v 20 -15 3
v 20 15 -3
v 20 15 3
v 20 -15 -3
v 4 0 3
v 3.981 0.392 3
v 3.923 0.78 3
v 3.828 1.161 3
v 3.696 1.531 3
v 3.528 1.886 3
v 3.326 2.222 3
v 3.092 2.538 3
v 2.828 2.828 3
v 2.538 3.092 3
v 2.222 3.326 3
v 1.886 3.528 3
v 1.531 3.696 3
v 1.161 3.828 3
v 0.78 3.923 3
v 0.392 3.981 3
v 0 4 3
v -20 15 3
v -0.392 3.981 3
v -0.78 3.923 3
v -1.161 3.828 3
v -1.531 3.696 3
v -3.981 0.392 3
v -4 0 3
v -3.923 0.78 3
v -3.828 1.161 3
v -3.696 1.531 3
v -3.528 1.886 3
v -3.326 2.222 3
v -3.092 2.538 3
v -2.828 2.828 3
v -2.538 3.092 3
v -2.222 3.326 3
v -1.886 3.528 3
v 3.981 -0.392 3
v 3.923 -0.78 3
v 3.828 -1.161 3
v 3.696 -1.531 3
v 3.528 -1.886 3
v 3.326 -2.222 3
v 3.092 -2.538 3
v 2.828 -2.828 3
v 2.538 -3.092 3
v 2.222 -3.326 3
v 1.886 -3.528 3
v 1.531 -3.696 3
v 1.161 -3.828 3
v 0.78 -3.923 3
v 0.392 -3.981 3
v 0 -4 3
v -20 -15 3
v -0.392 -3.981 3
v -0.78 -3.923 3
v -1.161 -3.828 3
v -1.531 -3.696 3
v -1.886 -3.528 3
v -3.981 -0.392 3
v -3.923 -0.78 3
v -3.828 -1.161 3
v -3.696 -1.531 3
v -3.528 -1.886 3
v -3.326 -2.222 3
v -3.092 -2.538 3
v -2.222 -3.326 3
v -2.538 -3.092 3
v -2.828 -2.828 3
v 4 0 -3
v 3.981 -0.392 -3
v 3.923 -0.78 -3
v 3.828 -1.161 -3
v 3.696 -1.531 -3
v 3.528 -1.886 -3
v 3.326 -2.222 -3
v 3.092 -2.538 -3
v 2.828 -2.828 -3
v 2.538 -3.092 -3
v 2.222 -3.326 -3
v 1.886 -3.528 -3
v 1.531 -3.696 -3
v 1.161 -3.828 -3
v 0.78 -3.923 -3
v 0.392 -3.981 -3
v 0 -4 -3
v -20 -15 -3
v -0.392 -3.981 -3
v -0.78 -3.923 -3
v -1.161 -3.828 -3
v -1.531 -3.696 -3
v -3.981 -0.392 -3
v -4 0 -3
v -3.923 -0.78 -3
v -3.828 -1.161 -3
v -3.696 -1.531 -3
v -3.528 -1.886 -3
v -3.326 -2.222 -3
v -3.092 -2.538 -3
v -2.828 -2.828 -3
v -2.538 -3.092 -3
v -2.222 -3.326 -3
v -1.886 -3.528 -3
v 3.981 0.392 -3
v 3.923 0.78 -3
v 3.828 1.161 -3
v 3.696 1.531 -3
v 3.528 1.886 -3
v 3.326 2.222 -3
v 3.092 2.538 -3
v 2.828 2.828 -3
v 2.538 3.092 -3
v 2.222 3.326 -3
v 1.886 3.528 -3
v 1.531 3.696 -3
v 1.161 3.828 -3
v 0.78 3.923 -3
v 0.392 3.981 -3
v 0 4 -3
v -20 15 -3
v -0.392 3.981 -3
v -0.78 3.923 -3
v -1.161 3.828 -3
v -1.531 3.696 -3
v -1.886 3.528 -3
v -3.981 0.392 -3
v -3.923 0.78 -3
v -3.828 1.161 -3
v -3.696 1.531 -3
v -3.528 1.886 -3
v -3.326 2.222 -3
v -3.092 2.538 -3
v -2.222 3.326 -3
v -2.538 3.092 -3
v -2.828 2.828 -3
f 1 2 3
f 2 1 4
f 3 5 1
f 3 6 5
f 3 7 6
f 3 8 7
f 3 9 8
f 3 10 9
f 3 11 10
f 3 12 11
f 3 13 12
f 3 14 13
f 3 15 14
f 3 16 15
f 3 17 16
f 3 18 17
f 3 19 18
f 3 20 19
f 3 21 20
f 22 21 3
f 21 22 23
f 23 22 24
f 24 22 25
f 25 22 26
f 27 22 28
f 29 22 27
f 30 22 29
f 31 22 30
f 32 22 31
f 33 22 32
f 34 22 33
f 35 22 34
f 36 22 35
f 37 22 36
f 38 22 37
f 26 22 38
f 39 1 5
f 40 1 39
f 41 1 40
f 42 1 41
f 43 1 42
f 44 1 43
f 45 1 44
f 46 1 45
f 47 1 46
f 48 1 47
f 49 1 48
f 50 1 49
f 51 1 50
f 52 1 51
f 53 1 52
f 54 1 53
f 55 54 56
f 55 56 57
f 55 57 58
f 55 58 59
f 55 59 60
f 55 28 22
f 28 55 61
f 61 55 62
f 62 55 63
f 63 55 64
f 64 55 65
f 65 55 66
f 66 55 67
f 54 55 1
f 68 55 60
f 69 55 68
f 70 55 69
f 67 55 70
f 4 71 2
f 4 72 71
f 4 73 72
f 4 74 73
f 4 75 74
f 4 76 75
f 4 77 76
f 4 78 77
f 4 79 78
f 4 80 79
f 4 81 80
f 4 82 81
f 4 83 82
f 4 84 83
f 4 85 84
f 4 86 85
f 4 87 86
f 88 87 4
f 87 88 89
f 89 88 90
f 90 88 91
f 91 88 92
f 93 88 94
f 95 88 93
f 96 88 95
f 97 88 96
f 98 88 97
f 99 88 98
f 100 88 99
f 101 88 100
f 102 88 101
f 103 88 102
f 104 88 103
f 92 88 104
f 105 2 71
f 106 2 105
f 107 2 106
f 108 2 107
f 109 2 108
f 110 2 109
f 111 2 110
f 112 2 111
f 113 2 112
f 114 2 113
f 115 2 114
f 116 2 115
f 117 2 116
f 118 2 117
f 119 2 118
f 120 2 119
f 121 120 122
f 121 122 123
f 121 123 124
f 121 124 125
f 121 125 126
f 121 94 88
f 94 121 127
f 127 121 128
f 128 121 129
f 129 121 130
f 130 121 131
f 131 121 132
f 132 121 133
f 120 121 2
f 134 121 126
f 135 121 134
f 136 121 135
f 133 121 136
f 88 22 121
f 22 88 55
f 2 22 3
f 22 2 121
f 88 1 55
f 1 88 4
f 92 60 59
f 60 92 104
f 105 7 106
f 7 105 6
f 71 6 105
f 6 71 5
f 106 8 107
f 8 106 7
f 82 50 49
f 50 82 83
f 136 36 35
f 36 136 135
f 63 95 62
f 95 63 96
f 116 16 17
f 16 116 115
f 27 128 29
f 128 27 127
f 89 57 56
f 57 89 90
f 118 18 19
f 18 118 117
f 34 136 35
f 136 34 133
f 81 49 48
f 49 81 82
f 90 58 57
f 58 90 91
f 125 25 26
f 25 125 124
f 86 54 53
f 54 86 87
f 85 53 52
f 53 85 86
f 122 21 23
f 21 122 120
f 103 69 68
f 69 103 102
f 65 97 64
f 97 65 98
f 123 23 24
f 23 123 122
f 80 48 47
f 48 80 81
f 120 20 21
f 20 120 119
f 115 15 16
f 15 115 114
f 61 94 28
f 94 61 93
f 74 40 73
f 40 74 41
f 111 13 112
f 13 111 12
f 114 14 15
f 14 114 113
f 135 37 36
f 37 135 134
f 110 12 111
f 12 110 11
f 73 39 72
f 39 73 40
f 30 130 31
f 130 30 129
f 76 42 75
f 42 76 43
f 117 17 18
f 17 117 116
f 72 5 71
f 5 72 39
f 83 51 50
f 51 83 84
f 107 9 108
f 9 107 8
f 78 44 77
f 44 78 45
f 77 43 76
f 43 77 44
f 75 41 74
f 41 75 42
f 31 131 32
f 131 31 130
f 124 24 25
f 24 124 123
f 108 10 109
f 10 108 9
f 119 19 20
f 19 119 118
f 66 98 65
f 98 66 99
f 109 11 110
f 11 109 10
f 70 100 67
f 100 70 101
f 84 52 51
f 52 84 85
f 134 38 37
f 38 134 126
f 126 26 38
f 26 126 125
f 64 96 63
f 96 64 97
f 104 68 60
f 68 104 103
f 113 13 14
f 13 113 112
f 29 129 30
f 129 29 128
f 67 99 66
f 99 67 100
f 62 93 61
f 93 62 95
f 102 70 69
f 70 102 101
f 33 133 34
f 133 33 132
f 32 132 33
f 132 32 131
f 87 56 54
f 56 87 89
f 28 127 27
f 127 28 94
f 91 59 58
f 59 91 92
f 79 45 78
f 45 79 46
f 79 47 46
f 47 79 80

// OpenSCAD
// A plate with a central bore.

plate_x = 40;
plate_y = 30;
plate_z = 6;
bore_d  = 8;
$fn = 64;

difference() {
    cube([plate_x, plate_y, plate_z], center = true);
    cylinder(h = plate_z + 2, d = bore_d, center = true);
}
